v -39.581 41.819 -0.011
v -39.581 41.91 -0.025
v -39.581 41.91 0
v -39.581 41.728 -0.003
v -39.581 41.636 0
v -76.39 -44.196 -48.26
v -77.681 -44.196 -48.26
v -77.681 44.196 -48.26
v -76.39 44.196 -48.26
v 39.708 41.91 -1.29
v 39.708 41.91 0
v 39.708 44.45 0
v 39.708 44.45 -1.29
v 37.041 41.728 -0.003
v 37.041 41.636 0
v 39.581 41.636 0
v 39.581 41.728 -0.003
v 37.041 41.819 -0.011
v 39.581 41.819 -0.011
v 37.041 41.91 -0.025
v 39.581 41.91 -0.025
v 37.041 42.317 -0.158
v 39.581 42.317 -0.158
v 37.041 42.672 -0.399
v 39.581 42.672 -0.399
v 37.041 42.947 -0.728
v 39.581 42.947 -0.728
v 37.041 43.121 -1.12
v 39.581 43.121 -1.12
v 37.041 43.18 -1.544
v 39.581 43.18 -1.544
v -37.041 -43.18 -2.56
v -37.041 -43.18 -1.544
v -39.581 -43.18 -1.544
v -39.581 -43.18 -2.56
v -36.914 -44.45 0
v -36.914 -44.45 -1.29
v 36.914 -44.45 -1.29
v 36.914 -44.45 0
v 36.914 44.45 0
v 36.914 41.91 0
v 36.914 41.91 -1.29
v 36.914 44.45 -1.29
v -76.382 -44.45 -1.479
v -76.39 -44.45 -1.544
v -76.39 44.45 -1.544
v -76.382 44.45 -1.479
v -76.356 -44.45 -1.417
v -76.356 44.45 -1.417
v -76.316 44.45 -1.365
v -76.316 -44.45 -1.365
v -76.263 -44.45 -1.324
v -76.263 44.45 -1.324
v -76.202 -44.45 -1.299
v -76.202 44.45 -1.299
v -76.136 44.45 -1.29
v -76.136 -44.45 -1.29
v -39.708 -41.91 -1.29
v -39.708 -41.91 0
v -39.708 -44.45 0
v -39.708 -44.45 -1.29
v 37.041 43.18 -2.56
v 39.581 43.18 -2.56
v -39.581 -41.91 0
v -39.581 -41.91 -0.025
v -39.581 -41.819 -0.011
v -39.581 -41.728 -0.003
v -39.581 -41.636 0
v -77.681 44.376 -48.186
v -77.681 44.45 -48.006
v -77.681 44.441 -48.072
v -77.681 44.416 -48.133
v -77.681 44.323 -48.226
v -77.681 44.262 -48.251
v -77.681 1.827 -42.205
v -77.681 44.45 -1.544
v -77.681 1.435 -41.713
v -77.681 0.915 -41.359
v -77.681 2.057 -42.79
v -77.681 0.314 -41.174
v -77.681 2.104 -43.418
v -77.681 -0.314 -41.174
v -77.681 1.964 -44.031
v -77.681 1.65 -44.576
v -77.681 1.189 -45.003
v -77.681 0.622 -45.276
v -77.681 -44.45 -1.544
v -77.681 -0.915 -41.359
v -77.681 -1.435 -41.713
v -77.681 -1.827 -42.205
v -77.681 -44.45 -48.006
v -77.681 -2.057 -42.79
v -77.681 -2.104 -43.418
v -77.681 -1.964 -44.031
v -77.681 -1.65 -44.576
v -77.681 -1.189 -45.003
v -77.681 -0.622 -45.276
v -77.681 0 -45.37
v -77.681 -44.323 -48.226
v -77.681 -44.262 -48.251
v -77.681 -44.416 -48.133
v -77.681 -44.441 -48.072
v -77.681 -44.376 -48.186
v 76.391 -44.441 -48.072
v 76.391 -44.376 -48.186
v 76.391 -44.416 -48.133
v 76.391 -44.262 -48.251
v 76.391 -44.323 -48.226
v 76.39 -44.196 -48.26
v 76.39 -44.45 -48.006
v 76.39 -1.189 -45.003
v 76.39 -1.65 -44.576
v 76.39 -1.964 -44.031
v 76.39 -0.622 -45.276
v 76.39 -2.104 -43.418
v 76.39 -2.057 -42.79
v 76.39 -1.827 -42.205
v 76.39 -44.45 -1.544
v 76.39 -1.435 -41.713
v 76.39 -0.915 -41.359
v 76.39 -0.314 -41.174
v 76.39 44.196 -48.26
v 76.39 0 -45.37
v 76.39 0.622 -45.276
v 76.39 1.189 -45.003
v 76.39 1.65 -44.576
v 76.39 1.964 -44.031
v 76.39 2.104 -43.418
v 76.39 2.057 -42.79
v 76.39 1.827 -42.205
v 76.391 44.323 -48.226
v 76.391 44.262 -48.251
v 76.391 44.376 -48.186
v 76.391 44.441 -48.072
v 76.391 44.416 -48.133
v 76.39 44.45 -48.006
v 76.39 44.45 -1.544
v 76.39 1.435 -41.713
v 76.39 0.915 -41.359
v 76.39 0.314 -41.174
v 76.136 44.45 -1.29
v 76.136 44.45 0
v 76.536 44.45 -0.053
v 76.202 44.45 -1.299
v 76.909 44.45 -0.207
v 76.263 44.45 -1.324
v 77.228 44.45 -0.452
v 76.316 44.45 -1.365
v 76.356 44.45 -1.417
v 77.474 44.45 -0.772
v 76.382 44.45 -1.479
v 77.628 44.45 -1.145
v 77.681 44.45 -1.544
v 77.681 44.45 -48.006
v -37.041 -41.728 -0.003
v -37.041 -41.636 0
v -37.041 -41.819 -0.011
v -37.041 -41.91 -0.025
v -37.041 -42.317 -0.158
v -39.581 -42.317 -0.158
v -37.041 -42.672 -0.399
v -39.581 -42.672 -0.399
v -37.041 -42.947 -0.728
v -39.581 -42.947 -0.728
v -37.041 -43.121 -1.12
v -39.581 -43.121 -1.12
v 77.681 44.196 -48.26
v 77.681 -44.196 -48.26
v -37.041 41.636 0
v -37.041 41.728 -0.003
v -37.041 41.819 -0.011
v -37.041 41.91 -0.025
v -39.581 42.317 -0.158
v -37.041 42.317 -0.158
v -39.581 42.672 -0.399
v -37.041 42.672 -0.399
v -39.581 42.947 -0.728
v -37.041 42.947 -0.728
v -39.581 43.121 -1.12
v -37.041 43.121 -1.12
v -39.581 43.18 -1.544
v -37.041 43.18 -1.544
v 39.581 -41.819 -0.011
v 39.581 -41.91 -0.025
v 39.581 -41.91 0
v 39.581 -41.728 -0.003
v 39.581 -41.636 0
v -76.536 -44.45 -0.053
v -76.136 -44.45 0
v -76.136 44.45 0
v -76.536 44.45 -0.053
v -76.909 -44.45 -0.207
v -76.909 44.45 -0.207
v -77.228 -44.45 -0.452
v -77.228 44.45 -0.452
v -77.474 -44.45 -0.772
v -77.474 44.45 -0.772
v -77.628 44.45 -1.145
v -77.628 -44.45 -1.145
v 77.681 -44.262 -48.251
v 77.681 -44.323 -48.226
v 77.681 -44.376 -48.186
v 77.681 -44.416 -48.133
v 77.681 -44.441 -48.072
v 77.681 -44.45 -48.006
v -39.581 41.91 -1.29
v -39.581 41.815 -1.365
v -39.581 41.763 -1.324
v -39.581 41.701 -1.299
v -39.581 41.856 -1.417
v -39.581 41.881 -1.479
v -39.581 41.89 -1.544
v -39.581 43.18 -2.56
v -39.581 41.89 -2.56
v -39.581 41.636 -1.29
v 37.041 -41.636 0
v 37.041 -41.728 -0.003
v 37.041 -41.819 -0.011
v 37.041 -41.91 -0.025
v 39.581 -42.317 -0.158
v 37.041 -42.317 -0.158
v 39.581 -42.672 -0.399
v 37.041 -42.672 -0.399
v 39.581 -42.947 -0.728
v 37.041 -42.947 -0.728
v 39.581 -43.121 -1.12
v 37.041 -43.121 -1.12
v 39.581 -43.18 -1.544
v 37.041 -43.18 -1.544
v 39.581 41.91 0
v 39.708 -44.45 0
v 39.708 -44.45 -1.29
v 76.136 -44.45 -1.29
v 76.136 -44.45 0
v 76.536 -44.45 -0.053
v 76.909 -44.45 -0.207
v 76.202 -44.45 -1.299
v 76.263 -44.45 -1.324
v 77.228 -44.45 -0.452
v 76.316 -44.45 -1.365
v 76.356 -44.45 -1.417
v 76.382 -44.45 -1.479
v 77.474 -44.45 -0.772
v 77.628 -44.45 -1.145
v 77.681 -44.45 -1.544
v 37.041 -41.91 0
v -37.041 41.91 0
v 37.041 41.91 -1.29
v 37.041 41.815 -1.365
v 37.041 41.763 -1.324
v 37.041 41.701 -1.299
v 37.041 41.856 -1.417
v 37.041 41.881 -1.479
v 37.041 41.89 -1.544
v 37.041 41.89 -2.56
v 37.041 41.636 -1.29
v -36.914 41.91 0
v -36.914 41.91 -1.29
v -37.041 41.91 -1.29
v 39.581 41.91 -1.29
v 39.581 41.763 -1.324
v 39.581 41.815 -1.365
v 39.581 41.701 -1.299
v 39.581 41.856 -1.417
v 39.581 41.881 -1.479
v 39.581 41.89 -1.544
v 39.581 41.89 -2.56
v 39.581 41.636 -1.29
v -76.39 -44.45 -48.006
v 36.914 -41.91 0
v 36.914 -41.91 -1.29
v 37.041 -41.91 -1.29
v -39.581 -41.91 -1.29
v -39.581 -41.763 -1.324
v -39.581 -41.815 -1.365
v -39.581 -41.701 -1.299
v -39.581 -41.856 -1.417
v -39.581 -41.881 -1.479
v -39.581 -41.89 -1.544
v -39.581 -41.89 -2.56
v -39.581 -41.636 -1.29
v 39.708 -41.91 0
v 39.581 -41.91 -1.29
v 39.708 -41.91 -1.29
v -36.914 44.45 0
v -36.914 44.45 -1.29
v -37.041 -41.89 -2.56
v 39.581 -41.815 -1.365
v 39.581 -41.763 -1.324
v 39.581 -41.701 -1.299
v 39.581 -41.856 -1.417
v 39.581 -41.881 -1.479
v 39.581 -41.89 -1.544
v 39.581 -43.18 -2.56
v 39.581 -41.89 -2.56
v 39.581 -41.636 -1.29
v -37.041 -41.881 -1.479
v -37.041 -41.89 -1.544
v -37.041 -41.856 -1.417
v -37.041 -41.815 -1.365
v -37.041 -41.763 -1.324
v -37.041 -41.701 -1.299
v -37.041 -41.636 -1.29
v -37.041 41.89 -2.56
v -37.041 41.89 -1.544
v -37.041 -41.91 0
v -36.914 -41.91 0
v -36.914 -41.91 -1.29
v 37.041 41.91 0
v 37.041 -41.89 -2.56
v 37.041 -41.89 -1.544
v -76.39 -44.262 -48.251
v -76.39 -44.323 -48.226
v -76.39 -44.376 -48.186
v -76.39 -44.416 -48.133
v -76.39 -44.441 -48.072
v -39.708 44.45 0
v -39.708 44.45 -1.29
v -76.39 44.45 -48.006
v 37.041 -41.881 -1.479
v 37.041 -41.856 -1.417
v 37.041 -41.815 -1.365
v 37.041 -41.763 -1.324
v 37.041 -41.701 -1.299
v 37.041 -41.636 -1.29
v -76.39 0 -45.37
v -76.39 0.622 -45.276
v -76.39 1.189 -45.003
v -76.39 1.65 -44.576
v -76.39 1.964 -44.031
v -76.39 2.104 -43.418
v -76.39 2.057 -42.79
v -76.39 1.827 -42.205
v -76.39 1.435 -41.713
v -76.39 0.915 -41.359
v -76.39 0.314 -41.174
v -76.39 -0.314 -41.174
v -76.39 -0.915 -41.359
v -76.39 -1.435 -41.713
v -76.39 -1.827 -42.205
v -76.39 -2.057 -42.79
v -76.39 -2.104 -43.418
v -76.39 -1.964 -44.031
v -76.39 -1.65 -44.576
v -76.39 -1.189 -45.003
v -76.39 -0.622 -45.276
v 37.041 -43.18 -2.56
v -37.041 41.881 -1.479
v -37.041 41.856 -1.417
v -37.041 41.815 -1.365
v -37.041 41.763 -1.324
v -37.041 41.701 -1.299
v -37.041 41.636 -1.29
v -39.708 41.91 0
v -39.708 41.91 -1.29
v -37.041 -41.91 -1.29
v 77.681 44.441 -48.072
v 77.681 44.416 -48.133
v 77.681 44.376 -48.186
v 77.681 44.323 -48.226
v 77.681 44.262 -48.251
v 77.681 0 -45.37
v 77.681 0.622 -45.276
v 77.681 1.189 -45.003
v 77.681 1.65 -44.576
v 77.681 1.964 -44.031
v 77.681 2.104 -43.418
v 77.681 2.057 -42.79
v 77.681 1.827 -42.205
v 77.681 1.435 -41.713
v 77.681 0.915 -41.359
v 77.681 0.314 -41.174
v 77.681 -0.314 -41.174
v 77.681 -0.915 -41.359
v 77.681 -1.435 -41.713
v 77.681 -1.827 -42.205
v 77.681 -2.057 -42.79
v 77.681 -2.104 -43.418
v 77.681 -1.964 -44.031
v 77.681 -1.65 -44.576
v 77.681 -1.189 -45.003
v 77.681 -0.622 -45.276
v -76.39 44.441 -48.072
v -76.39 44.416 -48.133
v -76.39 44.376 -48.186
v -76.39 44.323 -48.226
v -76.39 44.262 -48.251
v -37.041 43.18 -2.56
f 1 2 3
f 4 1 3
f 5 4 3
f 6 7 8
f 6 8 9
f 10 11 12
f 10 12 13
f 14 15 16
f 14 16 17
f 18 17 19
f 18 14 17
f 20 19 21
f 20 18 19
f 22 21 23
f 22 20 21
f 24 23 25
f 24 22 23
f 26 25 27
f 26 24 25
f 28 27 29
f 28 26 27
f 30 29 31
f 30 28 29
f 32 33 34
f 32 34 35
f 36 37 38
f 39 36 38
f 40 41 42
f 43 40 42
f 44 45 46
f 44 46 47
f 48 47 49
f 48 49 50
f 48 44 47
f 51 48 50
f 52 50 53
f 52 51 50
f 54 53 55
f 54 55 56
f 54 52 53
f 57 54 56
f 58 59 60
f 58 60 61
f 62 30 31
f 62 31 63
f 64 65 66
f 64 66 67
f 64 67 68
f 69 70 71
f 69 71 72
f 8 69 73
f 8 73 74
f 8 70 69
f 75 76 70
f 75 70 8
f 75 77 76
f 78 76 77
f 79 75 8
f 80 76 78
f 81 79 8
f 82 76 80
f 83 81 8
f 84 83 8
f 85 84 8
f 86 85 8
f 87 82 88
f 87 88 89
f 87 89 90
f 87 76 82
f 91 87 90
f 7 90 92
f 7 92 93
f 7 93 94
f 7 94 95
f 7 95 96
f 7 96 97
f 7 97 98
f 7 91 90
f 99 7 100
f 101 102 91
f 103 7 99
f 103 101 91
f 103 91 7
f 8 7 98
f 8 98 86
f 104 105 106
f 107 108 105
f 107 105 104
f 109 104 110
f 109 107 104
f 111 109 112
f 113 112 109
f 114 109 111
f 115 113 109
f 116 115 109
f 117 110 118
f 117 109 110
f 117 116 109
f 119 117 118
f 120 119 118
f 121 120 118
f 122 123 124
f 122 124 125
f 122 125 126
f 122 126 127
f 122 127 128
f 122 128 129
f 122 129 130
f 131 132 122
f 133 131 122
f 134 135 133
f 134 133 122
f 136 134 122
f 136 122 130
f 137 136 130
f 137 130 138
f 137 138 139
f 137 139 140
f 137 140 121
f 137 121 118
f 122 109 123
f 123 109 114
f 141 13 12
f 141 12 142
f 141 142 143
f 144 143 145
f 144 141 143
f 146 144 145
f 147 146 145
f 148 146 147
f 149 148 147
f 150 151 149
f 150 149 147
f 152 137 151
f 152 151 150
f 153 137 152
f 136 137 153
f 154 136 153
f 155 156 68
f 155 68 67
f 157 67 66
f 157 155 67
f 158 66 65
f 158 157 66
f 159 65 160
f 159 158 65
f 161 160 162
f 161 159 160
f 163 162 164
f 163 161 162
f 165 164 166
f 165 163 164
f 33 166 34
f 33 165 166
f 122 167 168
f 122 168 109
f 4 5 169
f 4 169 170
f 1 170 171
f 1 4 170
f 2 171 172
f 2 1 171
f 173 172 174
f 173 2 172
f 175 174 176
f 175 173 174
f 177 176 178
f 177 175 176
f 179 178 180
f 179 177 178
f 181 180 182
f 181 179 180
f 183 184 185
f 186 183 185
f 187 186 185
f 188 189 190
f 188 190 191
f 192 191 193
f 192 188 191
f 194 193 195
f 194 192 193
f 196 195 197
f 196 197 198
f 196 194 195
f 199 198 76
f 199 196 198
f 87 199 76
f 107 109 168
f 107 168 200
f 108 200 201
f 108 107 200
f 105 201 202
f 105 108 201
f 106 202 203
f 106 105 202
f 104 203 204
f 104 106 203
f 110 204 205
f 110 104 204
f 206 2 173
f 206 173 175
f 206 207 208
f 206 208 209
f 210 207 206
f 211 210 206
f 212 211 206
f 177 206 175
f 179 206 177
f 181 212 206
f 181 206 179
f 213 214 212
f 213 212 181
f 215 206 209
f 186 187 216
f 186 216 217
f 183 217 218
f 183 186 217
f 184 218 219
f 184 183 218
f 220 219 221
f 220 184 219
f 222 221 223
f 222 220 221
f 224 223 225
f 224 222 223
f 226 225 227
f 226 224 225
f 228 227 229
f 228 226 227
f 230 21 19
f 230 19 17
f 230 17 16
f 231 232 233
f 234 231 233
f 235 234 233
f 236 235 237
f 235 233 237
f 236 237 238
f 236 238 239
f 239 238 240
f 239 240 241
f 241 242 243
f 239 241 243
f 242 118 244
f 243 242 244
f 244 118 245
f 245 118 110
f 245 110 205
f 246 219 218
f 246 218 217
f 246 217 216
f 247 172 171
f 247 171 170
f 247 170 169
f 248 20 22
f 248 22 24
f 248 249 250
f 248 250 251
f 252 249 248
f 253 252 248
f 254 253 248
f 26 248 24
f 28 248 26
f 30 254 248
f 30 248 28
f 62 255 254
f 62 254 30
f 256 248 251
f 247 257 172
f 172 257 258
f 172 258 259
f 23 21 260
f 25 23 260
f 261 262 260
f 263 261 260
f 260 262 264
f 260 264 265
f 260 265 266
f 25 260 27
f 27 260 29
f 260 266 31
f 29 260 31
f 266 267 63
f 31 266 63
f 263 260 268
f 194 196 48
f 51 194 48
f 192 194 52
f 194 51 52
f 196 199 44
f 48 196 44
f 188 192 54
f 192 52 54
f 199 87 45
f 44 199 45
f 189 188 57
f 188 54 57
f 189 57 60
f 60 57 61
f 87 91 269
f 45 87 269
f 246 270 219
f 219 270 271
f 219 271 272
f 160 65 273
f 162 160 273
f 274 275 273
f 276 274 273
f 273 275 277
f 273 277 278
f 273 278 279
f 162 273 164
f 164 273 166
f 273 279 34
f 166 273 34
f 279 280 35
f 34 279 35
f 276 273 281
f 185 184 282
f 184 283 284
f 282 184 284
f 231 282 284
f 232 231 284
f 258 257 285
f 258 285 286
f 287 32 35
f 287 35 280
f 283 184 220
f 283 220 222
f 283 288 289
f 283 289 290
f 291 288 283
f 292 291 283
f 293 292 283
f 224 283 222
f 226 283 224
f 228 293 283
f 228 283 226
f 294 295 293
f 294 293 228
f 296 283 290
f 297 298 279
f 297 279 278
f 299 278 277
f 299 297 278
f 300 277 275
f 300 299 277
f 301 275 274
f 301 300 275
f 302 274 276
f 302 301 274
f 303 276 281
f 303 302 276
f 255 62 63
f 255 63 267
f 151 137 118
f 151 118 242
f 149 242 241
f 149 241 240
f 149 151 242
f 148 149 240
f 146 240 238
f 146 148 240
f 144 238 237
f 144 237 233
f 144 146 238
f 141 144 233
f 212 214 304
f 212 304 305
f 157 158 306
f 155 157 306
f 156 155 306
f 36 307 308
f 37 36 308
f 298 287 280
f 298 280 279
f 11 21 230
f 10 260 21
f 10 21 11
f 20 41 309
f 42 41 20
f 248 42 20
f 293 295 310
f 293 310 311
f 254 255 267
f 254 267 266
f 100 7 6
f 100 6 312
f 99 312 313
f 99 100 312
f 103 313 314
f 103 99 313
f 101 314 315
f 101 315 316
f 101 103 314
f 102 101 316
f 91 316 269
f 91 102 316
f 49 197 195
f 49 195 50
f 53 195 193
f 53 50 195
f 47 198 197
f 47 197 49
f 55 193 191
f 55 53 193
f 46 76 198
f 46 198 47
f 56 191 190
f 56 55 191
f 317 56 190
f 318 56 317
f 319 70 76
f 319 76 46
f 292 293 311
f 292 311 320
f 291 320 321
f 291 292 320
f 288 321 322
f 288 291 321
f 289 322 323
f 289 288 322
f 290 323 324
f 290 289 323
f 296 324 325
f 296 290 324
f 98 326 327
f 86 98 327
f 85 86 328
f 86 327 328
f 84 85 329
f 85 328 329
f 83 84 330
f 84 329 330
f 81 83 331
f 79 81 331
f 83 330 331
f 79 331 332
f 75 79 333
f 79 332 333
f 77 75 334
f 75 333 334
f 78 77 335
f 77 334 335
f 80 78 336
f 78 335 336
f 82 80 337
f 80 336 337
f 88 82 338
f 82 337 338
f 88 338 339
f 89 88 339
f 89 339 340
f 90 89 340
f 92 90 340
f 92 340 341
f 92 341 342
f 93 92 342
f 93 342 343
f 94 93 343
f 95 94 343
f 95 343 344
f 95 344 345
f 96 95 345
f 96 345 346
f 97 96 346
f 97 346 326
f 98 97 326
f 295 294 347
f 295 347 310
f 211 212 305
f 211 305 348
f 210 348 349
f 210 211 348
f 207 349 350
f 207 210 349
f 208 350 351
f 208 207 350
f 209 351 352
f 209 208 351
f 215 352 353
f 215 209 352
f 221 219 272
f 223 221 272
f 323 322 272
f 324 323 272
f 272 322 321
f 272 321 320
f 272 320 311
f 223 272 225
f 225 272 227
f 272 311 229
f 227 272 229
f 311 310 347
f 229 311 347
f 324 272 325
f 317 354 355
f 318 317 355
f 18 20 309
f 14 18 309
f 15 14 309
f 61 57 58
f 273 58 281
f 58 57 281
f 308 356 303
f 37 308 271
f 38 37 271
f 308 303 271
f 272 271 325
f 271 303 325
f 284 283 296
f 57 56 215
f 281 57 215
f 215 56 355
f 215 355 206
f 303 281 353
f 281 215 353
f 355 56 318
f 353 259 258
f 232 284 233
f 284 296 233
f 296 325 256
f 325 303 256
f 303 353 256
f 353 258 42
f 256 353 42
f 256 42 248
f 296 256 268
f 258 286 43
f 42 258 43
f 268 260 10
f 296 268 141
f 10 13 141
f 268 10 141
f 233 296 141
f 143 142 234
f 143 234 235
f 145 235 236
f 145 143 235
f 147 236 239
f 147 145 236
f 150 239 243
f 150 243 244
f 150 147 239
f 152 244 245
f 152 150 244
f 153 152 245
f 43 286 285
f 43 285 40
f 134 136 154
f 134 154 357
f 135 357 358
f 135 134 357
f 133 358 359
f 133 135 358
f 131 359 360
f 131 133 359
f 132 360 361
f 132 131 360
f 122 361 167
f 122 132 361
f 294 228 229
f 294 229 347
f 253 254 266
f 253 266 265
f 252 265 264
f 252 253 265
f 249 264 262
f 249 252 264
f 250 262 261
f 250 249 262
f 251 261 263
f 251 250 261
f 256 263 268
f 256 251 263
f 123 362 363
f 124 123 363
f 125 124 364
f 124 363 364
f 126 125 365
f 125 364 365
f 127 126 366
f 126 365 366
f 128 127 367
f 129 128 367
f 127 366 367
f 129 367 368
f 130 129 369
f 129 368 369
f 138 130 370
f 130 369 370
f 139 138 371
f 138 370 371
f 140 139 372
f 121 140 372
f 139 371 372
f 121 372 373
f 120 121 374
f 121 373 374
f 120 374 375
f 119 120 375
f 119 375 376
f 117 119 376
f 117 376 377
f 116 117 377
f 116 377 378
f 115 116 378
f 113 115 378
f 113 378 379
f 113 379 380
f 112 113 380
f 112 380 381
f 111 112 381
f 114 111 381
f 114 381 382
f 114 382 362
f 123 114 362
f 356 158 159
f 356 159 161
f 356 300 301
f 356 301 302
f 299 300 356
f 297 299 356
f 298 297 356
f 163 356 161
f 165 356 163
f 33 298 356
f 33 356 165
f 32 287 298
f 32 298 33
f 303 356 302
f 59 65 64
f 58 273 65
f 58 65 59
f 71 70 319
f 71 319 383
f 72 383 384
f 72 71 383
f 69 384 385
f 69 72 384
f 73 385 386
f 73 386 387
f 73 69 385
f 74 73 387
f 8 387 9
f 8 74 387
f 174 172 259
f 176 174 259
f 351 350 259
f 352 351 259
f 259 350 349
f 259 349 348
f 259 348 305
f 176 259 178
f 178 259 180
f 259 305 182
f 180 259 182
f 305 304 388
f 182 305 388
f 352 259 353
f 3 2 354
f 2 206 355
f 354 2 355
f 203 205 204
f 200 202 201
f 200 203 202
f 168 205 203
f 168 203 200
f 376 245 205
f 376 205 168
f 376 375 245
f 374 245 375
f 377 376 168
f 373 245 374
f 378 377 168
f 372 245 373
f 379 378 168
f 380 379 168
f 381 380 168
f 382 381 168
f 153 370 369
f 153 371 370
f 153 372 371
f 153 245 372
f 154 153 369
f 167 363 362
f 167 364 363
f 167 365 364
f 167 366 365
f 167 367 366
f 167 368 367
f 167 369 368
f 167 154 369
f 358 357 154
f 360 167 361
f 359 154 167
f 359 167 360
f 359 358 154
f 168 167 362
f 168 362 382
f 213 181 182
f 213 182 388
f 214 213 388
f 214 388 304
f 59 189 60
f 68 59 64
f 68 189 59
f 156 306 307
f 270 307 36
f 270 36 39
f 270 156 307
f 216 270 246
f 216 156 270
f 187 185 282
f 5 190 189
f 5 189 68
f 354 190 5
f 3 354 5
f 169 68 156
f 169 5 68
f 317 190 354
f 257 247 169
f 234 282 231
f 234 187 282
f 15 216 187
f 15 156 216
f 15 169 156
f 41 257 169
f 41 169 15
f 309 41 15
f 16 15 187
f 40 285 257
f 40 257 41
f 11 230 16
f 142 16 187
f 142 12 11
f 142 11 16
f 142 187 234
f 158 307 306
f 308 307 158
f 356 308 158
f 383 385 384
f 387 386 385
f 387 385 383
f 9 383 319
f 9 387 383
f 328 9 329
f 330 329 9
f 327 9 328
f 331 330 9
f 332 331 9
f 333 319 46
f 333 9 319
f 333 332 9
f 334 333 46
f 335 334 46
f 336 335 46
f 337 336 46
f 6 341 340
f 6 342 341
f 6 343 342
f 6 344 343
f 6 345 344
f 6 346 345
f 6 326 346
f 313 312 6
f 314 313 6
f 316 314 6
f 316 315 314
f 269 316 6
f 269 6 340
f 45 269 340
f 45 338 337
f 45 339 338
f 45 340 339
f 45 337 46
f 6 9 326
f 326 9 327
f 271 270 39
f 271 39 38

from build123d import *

# Parameters (mm, degrees)
SKETCH1_W                         = 152.4
SKETCH1_H                         = 88.9
BASE_FLANGE1_DEPTH                = 1.29032
EDGE_FLANGE1_STRIP_W              = 5.85978
EDGE_FLANGE1_STRIP_H              = 1.29032
EDGE_FLANGE1_STRIP_CUT_DEPTH      = 88.9
EDGE_FLANGE1_STRIP_2_W            = 5.85978
EDGE_FLANGE1_STRIP_2_H            = 1.29032
EDGE_FLANGE1_STRIP_CUT_2_DEPTH    = 88.9
EDGE_FLANGE1_DEPTH                = 88.9
EDGE_FLANGE1_BEND_DEPTH           = 88.9
F_4_22MM_HOLE_FOR_M3_CLINCH_NUT_D = 4.22
BREAK_CORNER1_START               = -77.68082
BREAK_CORNER1_DEPTH               = 155.36164
CUT_THICKEN1_START                = 41.91
CUT_THICKEN1_OUTLINE_W            = 0.127
CUT_THICKEN1_OUTLINE_H            = 1.29032
CUT_THICKEN1_DEPTH                = 2.54
CUT_THICKEN2_START                = 41.91
CUT_THICKEN2_OUTLINE_W            = 0.127
CUT_THICKEN2_OUTLINE_H            = 1.29032
CUT_THICKEN2_DEPTH                = 2.54
MIRROR7_START                     = 41.91
MIRROR7_COPY_1_SKETCH_W           = 0.127
MIRROR7_COPY_1_SKETCH_H           = 1.29032
MIRROR7_COPY_1_DEPTH              = 2.54
MIRROR7_COPY_2_SKETCH_W           = 0.127
MIRROR7_COPY_2_SKETCH_H           = 1.29032
MIRROR7_COPY_2_DEPTH              = 2.54
MOVE_FACE1_BY                     = 1.27
MOVE_FACE1_2_BY                   = 1.27
MOVE_FACE1_3_BY                   = 1.27
MOVE_FACE1_4_BY                   = 1.27
EDGE_FLANGE2_STRIP_W              = 5.66928
EDGE_FLANGE2_STRIP_H              = 1.29032
EDGE_FLANGE2_STRIP_CUT_DEPTH      = 2.54
EDGE_FLANGE2_STRIP_2_W            = 5.66928
EDGE_FLANGE2_STRIP_2_H            = 1.29032
EDGE_FLANGE2_STRIP_CUT_2_DEPTH    = 2.54
EDGE_FLANGE2_STRIP_3_W            = 5.66928
EDGE_FLANGE2_STRIP_3_H            = 1.29032
EDGE_FLANGE2_STRIP_CUT_3_DEPTH    = 2.54
EDGE_FLANGE2_STRIP_4_W            = 5.66928
EDGE_FLANGE2_STRIP_4_H            = 1.29032
EDGE_FLANGE2_STRIP_CUT_4_DEPTH    = 2.54
EDGE_FLANGE2_DEPTH                = 2.54
EDGE_FLANGE2_BEND_DEPTH           = 2.54
EDGE_FLANGE2_BEND_2_DEPTH         = 2.54
EDGE_FLANGE2_BEND_3_DEPTH         = 2.54


# Read off the part's stored shape, not the designer's step: Break-Corner1, Cut-Thicken1, Cut-Thicken2
# Sheet-metal steps are written as plain solids
with BuildPart() as part:
    # Sketch1 → Base-Flange1 (new body)
    with BuildSketch(Plane.XY):
        Rectangle(SKETCH1_W, SKETCH1_H)
    extrude(amount=-BASE_FLANGE1_DEPTH)

    # Edge-Flange1 strip (across the edge) → Edge-Flange1 strip cut (cut)
    with BuildSketch(Plane(origin=(-76.3905, -44.45, -1.29032), x_dir=(1, 0, 0), z_dir=(0, 1, 0))):
        with Locations((-2.67589, -0.64516)):
            Rectangle(EDGE_FLANGE1_STRIP_W, EDGE_FLANGE1_STRIP_H)
    extrude(amount=EDGE_FLANGE1_STRIP_CUT_DEPTH, mode=Mode.SUBTRACT)

    # Edge-Flange1 strip 2 (across the edge) → Edge-Flange1 strip cut 2 (cut)
    with BuildSketch(Plane(origin=(76.3905, 44.45, -1.29032), x_dir=(-1, 0, 0), z_dir=(0, -1, 0))):
        with Locations((-2.67589, -0.64516)):
            Rectangle(EDGE_FLANGE1_STRIP_2_W, EDGE_FLANGE1_STRIP_2_H)
    extrude(amount=EDGE_FLANGE1_STRIP_CUT_2_DEPTH, mode=Mode.SUBTRACT)

    # Edge-Flange1 section (across the edge) → Edge-Flange1 (add)
    with BuildSketch(Plane(origin=(-76.3905, -44.45, -1.29032), x_dir=(1, 0, 0), z_dir=(0, 1, 0))):
        with BuildLine():
            Line((-1.29032, 0.254), (-1.29032, 46.96968))
            Line((-1.29032, 46.96968), (0, 46.96968))
            Line((0, 46.96968), (0, 0.254))
            ThreePointArc((0, 0.254), (0.074394878, 0.074394878), (0.254, 0))
            Line((0.254, 0), (0.254, -1.29032))
            ThreePointArc((0.254, -1.29032), (-0.837999144, -0.837999144), (-1.29032, 0.254))
        make_face()
    extrude(amount=EDGE_FLANGE1_DEPTH)

    # Edge-Flange1 section 2 (across the edge) → Edge-Flange1 bend (add)
    with BuildSketch(Plane(origin=(76.3905, 44.45, -1.29032), x_dir=(-1, 0, 0), z_dir=(0, -1, 0))):
        with BuildLine():
            Line((-1.29032, 0.254), (-1.29032, 46.96968))
            Line((-1.29032, 46.96968), (0, 46.96968))
            Line((0, 46.96968), (0, 0.254))
            ThreePointArc((0, 0.254), (0.074394878, 0.074394878), (0.254, 0))
            Line((0.254, 0), (0.254, -1.29032))
            ThreePointArc((0.254, -1.29032), (-0.837999144, -0.837999144), (-1.29032, 0.254))
        make_face()
    extrude(amount=EDGE_FLANGE1_BEND_DEPTH)

    # Ø4.22mm hole for M3 Clinch nut (through all)
    with Locations(Plane.ZY.offset(77.68082)):
        with Locations((-43.26, 0)):
            f_4_22mm_hole_for_m3_clinch_nut = Hole(F_4_22MM_HOLE_FOR_M3_CLINCH_NUT_D / 2)

    # Mirror1: Ø4.22mm hole for M3 Clinch nut across plane
    add(f_4_22mm_hole_for_m3_clinch_nut.mirror(Plane(origin=(0, 0, 0), x_dir=(0, 0, 1), z_dir=(1, 0, 0))), mode=Mode.SUBTRACT)

    # Break-Corner1 outline → Break-Corner1 (cut)
    with BuildSketch(Plane.YZ.offset(BREAK_CORNER1_START)):
        with BuildLine():
            Line((44.45, -48.26), (44.45, -48.006))
            ThreePointArc((44.45, -48.006), (44.375605122, -48.185605122), (44.196, -48.26))
            Line((44.196, -48.26), (44.45, -48.26))
        make_face()
        with BuildLine():
            Line((-44.45, -48.26), (-44.196, -48.26))
            ThreePointArc((-44.196, -48.26), (-44.375605122, -48.185605122), (-44.45, -48.006))
            Line((-44.45, -48.006), (-44.45, -48.26))
        make_face()
    extrude(amount=BREAK_CORNER1_DEPTH, mode=Mode.SUBTRACT)

    # Cut-Thicken1 outline → Cut-Thicken1 (cut)
    with BuildSketch(Plane(origin=(0, 0, 0), x_dir=(1, 0, 0), z_dir=(0, 1, 0)).offset(CUT_THICKEN1_START)):
        with Locations((36.97732, 0.64516)):
            Rectangle(CUT_THICKEN1_OUTLINE_W, CUT_THICKEN1_OUTLINE_H)
    cut_thicken1 = extrude(amount=CUT_THICKEN1_DEPTH, mode=Mode.SUBTRACT)

    # Cut-Thicken2 outline → Cut-Thicken2 (cut)
    with BuildSketch(Plane(origin=(0, 0, 0), x_dir=(1, 0, 0), z_dir=(0, 1, 0)).offset(CUT_THICKEN2_START)):
        with Locations((39.64432, 0.64516)):
            Rectangle(CUT_THICKEN2_OUTLINE_W, CUT_THICKEN2_OUTLINE_H)
    cut_thicken2 = extrude(amount=CUT_THICKEN2_DEPTH, mode=Mode.SUBTRACT)

    # Mirror6: Cut-Thicken1, Cut-Thicken2 across plane
    add(cut_thicken1.mirror(Plane(origin=(0, 0, 0), x_dir=(0, 0, 1), z_dir=(1, 0, 0))), mode=Mode.SUBTRACT)
    add(cut_thicken2.mirror(Plane(origin=(0, 0, 0), x_dir=(0, 0, 1), z_dir=(1, 0, 0))), mode=Mode.SUBTRACT)

    # Mirror7: Cut-Thicken1, Cut-Thicken2 across plane
    add(cut_thicken1.mirror(Plane.ZX), mode=Mode.SUBTRACT)
    add(cut_thicken2.mirror(Plane.ZX), mode=Mode.SUBTRACT)

    # Mirror7 copy 1 sketch → Mirror7 copy 1 (cut)
    with BuildSketch(Plane(origin=(0, 0, 0), x_dir=(-1, 0, 0), z_dir=(0, -1, 0)).offset(MIRROR7_START)):
        with Locations((36.97732, 0.64516)):
            Rectangle(MIRROR7_COPY_1_SKETCH_W, MIRROR7_COPY_1_SKETCH_H)
    extrude(amount=MIRROR7_COPY_1_DEPTH, mode=Mode.SUBTRACT)

    # Mirror7 copy 2 sketch → Mirror7 copy 2 (cut)
    with BuildSketch(Plane(origin=(0, 0, 0), x_dir=(-1, 0, 0), z_dir=(0, -1, 0)).offset(MIRROR7_START)):
        with Locations((39.64432, 0.64516)):
            Rectangle(MIRROR7_COPY_2_SKETCH_W, MIRROR7_COPY_2_SKETCH_H)
    extrude(amount=MIRROR7_COPY_2_DEPTH, mode=Mode.SUBTRACT)

    # Move Face1: a face moved inward by 1.27
    extrude(part.faces().sort_by_distance((-38.31082, -44.45, -0.64516))[0], amount=MOVE_FACE1_BY, dir=(0, 1, 0), mode=Mode.SUBTRACT)

    # Move Face1 2: a face moved inward by 1.27
    extrude(part.faces().sort_by_distance((38.31082, -44.45, -0.64516))[0], amount=MOVE_FACE1_2_BY, dir=(0, 1, 0), mode=Mode.SUBTRACT)

    # Move Face1 3: a face moved inward by 1.27
    extrude(part.faces().sort_by_distance((-38.31082, 44.45, -0.64516))[0], amount=MOVE_FACE1_3_BY, dir=(0, -1, 0), mode=Mode.SUBTRACT)

    # Move Face1 4: a face moved inward by 1.27
    extrude(part.faces().sort_by_distance((38.31082, 44.45, -0.64516))[0], amount=MOVE_FACE1_4_BY, dir=(0, -1, 0), mode=Mode.SUBTRACT)

    # Edge-Flange2 strip (across the edge) → Edge-Flange2 strip cut (cut)
    with BuildSketch(Plane(origin=(37.04082, 43.18, -1.29032), x_dir=(0, -1, 0), z_dir=(1, 0, 0))):
        with Locations((-1.29032, -0.64516)):
            Rectangle(EDGE_FLANGE2_STRIP_W, EDGE_FLANGE2_STRIP_H)
    extrude(amount=EDGE_FLANGE2_STRIP_CUT_DEPTH, mode=Mode.SUBTRACT)

    # Edge-Flange2 strip 2 (across the edge) → Edge-Flange2 strip cut 2 (cut)
    with BuildSketch(Plane(origin=(-39.58082, 43.18, -1.29032), x_dir=(0, -1, 0), z_dir=(1, 0, 0))):
        with Locations((-1.29032, -0.64516)):
            Rectangle(EDGE_FLANGE2_STRIP_2_W, EDGE_FLANGE2_STRIP_2_H)
    extrude(amount=EDGE_FLANGE2_STRIP_CUT_2_DEPTH, mode=Mode.SUBTRACT)

    # Edge-Flange2 strip 3 (across the edge) → Edge-Flange2 strip cut 3 (cut)
    with BuildSketch(Plane(origin=(39.58082, -43.18, -1.29032), x_dir=(0, 1, 0), z_dir=(-1, 0, 0))):
        with Locations((-1.29032, -0.64516)):
            Rectangle(EDGE_FLANGE2_STRIP_3_W, EDGE_FLANGE2_STRIP_3_H)
    extrude(amount=EDGE_FLANGE2_STRIP_CUT_3_DEPTH, mode=Mode.SUBTRACT)

    # Edge-Flange2 strip 4 (across the edge) → Edge-Flange2 strip cut 4 (cut)
    with BuildSketch(Plane(origin=(-37.04082, -43.18, -1.29032), x_dir=(0, 1, 0), z_dir=(-1, 0, 0))):
        with Locations((-1.29032, -0.64516)):
            Rectangle(EDGE_FLANGE2_STRIP_4_W, EDGE_FLANGE2_STRIP_4_H)
    extrude(amount=EDGE_FLANGE2_STRIP_CUT_4_DEPTH, mode=Mode.SUBTRACT)

    # Edge-Flange2 section (across the edge) → Edge-Flange2 (add)
    with BuildSketch(Plane(origin=(37.04082, 43.18, -1.29032), x_dir=(0, -1, 0), z_dir=(1, 0, 0))):
        with BuildLine():
            Line((0, 0.254), (0, 1.27))
            Line((0, 1.27), (1.29032, 1.27))
            Line((1.29032, 1.27), (1.29032, 0.254))
            ThreePointArc((1.29032, 0.254), (1.364714878, 0.074394878), (1.54432, 0))
            Line((1.54432, 0), (1.54432, -1.29032))
            ThreePointArc((1.54432, -1.29032), (0.452320856, -0.837999144), (0, 0.254))
        make_face()
    extrude(amount=EDGE_FLANGE2_DEPTH)

    # Edge-Flange2 section 2 (across the edge) → Edge-Flange2 bend (add)
    with BuildSketch(Plane(origin=(-39.58082, 43.18, -1.29032), x_dir=(0, -1, 0), z_dir=(1, 0, 0))):
        with BuildLine():
            Line((0, 0.254), (0, 1.27))
            Line((0, 1.27), (1.29032, 1.27))
            Line((1.29032, 1.27), (1.29032, 0.254))
            ThreePointArc((1.29032, 0.254), (1.364714878, 0.074394878), (1.54432, 0))
            Line((1.54432, 0), (1.54432, -1.29032))
            ThreePointArc((1.54432, -1.29032), (0.452320856, -0.837999144), (0, 0.254))
        make_face()
    extrude(amount=EDGE_FLANGE2_BEND_DEPTH)

    # Edge-Flange2 section 3 (across the edge) → Edge-Flange2 bend 2 (add)
    with BuildSketch(Plane(origin=(39.58082, -43.18, -1.29032), x_dir=(0, 1, 0), z_dir=(-1, 0, 0))):
        with BuildLine():
            Line((0, 0.254), (0, 1.27))
            Line((0, 1.27), (1.29032, 1.27))
            Line((1.29032, 1.27), (1.29032, 0.254))
            ThreePointArc((1.29032, 0.254), (1.364714878, 0.074394878), (1.54432, 0))
            Line((1.54432, 0), (1.54432, -1.29032))
            ThreePointArc((1.54432, -1.29032), (0.452320856, -0.837999144), (0, 0.254))
        make_face()
    extrude(amount=EDGE_FLANGE2_BEND_2_DEPTH)

    # Edge-Flange2 section 4 (across the edge) → Edge-Flange2 bend 3 (add)
    with BuildSketch(Plane(origin=(-37.04082, -43.18, -1.29032), x_dir=(0, 1, 0), z_dir=(-1, 0, 0))):
        with BuildLine():
            Line((0, 0.254), (0, 1.27))
            Line((0, 1.27), (1.29032, 1.27))
            Line((1.29032, 1.27), (1.29032, 0.254))
            ThreePointArc((1.29032, 0.254), (1.364714878, 0.074394878), (1.54432, 0))
            Line((1.54432, 0), (1.54432, -1.29032))
            ThreePointArc((1.54432, -1.29032), (0.452320856, -0.837999144), (0, 0.254))
        make_face()
    extrude(amount=EDGE_FLANGE2_BEND_3_DEPTH)


solid = part.part
